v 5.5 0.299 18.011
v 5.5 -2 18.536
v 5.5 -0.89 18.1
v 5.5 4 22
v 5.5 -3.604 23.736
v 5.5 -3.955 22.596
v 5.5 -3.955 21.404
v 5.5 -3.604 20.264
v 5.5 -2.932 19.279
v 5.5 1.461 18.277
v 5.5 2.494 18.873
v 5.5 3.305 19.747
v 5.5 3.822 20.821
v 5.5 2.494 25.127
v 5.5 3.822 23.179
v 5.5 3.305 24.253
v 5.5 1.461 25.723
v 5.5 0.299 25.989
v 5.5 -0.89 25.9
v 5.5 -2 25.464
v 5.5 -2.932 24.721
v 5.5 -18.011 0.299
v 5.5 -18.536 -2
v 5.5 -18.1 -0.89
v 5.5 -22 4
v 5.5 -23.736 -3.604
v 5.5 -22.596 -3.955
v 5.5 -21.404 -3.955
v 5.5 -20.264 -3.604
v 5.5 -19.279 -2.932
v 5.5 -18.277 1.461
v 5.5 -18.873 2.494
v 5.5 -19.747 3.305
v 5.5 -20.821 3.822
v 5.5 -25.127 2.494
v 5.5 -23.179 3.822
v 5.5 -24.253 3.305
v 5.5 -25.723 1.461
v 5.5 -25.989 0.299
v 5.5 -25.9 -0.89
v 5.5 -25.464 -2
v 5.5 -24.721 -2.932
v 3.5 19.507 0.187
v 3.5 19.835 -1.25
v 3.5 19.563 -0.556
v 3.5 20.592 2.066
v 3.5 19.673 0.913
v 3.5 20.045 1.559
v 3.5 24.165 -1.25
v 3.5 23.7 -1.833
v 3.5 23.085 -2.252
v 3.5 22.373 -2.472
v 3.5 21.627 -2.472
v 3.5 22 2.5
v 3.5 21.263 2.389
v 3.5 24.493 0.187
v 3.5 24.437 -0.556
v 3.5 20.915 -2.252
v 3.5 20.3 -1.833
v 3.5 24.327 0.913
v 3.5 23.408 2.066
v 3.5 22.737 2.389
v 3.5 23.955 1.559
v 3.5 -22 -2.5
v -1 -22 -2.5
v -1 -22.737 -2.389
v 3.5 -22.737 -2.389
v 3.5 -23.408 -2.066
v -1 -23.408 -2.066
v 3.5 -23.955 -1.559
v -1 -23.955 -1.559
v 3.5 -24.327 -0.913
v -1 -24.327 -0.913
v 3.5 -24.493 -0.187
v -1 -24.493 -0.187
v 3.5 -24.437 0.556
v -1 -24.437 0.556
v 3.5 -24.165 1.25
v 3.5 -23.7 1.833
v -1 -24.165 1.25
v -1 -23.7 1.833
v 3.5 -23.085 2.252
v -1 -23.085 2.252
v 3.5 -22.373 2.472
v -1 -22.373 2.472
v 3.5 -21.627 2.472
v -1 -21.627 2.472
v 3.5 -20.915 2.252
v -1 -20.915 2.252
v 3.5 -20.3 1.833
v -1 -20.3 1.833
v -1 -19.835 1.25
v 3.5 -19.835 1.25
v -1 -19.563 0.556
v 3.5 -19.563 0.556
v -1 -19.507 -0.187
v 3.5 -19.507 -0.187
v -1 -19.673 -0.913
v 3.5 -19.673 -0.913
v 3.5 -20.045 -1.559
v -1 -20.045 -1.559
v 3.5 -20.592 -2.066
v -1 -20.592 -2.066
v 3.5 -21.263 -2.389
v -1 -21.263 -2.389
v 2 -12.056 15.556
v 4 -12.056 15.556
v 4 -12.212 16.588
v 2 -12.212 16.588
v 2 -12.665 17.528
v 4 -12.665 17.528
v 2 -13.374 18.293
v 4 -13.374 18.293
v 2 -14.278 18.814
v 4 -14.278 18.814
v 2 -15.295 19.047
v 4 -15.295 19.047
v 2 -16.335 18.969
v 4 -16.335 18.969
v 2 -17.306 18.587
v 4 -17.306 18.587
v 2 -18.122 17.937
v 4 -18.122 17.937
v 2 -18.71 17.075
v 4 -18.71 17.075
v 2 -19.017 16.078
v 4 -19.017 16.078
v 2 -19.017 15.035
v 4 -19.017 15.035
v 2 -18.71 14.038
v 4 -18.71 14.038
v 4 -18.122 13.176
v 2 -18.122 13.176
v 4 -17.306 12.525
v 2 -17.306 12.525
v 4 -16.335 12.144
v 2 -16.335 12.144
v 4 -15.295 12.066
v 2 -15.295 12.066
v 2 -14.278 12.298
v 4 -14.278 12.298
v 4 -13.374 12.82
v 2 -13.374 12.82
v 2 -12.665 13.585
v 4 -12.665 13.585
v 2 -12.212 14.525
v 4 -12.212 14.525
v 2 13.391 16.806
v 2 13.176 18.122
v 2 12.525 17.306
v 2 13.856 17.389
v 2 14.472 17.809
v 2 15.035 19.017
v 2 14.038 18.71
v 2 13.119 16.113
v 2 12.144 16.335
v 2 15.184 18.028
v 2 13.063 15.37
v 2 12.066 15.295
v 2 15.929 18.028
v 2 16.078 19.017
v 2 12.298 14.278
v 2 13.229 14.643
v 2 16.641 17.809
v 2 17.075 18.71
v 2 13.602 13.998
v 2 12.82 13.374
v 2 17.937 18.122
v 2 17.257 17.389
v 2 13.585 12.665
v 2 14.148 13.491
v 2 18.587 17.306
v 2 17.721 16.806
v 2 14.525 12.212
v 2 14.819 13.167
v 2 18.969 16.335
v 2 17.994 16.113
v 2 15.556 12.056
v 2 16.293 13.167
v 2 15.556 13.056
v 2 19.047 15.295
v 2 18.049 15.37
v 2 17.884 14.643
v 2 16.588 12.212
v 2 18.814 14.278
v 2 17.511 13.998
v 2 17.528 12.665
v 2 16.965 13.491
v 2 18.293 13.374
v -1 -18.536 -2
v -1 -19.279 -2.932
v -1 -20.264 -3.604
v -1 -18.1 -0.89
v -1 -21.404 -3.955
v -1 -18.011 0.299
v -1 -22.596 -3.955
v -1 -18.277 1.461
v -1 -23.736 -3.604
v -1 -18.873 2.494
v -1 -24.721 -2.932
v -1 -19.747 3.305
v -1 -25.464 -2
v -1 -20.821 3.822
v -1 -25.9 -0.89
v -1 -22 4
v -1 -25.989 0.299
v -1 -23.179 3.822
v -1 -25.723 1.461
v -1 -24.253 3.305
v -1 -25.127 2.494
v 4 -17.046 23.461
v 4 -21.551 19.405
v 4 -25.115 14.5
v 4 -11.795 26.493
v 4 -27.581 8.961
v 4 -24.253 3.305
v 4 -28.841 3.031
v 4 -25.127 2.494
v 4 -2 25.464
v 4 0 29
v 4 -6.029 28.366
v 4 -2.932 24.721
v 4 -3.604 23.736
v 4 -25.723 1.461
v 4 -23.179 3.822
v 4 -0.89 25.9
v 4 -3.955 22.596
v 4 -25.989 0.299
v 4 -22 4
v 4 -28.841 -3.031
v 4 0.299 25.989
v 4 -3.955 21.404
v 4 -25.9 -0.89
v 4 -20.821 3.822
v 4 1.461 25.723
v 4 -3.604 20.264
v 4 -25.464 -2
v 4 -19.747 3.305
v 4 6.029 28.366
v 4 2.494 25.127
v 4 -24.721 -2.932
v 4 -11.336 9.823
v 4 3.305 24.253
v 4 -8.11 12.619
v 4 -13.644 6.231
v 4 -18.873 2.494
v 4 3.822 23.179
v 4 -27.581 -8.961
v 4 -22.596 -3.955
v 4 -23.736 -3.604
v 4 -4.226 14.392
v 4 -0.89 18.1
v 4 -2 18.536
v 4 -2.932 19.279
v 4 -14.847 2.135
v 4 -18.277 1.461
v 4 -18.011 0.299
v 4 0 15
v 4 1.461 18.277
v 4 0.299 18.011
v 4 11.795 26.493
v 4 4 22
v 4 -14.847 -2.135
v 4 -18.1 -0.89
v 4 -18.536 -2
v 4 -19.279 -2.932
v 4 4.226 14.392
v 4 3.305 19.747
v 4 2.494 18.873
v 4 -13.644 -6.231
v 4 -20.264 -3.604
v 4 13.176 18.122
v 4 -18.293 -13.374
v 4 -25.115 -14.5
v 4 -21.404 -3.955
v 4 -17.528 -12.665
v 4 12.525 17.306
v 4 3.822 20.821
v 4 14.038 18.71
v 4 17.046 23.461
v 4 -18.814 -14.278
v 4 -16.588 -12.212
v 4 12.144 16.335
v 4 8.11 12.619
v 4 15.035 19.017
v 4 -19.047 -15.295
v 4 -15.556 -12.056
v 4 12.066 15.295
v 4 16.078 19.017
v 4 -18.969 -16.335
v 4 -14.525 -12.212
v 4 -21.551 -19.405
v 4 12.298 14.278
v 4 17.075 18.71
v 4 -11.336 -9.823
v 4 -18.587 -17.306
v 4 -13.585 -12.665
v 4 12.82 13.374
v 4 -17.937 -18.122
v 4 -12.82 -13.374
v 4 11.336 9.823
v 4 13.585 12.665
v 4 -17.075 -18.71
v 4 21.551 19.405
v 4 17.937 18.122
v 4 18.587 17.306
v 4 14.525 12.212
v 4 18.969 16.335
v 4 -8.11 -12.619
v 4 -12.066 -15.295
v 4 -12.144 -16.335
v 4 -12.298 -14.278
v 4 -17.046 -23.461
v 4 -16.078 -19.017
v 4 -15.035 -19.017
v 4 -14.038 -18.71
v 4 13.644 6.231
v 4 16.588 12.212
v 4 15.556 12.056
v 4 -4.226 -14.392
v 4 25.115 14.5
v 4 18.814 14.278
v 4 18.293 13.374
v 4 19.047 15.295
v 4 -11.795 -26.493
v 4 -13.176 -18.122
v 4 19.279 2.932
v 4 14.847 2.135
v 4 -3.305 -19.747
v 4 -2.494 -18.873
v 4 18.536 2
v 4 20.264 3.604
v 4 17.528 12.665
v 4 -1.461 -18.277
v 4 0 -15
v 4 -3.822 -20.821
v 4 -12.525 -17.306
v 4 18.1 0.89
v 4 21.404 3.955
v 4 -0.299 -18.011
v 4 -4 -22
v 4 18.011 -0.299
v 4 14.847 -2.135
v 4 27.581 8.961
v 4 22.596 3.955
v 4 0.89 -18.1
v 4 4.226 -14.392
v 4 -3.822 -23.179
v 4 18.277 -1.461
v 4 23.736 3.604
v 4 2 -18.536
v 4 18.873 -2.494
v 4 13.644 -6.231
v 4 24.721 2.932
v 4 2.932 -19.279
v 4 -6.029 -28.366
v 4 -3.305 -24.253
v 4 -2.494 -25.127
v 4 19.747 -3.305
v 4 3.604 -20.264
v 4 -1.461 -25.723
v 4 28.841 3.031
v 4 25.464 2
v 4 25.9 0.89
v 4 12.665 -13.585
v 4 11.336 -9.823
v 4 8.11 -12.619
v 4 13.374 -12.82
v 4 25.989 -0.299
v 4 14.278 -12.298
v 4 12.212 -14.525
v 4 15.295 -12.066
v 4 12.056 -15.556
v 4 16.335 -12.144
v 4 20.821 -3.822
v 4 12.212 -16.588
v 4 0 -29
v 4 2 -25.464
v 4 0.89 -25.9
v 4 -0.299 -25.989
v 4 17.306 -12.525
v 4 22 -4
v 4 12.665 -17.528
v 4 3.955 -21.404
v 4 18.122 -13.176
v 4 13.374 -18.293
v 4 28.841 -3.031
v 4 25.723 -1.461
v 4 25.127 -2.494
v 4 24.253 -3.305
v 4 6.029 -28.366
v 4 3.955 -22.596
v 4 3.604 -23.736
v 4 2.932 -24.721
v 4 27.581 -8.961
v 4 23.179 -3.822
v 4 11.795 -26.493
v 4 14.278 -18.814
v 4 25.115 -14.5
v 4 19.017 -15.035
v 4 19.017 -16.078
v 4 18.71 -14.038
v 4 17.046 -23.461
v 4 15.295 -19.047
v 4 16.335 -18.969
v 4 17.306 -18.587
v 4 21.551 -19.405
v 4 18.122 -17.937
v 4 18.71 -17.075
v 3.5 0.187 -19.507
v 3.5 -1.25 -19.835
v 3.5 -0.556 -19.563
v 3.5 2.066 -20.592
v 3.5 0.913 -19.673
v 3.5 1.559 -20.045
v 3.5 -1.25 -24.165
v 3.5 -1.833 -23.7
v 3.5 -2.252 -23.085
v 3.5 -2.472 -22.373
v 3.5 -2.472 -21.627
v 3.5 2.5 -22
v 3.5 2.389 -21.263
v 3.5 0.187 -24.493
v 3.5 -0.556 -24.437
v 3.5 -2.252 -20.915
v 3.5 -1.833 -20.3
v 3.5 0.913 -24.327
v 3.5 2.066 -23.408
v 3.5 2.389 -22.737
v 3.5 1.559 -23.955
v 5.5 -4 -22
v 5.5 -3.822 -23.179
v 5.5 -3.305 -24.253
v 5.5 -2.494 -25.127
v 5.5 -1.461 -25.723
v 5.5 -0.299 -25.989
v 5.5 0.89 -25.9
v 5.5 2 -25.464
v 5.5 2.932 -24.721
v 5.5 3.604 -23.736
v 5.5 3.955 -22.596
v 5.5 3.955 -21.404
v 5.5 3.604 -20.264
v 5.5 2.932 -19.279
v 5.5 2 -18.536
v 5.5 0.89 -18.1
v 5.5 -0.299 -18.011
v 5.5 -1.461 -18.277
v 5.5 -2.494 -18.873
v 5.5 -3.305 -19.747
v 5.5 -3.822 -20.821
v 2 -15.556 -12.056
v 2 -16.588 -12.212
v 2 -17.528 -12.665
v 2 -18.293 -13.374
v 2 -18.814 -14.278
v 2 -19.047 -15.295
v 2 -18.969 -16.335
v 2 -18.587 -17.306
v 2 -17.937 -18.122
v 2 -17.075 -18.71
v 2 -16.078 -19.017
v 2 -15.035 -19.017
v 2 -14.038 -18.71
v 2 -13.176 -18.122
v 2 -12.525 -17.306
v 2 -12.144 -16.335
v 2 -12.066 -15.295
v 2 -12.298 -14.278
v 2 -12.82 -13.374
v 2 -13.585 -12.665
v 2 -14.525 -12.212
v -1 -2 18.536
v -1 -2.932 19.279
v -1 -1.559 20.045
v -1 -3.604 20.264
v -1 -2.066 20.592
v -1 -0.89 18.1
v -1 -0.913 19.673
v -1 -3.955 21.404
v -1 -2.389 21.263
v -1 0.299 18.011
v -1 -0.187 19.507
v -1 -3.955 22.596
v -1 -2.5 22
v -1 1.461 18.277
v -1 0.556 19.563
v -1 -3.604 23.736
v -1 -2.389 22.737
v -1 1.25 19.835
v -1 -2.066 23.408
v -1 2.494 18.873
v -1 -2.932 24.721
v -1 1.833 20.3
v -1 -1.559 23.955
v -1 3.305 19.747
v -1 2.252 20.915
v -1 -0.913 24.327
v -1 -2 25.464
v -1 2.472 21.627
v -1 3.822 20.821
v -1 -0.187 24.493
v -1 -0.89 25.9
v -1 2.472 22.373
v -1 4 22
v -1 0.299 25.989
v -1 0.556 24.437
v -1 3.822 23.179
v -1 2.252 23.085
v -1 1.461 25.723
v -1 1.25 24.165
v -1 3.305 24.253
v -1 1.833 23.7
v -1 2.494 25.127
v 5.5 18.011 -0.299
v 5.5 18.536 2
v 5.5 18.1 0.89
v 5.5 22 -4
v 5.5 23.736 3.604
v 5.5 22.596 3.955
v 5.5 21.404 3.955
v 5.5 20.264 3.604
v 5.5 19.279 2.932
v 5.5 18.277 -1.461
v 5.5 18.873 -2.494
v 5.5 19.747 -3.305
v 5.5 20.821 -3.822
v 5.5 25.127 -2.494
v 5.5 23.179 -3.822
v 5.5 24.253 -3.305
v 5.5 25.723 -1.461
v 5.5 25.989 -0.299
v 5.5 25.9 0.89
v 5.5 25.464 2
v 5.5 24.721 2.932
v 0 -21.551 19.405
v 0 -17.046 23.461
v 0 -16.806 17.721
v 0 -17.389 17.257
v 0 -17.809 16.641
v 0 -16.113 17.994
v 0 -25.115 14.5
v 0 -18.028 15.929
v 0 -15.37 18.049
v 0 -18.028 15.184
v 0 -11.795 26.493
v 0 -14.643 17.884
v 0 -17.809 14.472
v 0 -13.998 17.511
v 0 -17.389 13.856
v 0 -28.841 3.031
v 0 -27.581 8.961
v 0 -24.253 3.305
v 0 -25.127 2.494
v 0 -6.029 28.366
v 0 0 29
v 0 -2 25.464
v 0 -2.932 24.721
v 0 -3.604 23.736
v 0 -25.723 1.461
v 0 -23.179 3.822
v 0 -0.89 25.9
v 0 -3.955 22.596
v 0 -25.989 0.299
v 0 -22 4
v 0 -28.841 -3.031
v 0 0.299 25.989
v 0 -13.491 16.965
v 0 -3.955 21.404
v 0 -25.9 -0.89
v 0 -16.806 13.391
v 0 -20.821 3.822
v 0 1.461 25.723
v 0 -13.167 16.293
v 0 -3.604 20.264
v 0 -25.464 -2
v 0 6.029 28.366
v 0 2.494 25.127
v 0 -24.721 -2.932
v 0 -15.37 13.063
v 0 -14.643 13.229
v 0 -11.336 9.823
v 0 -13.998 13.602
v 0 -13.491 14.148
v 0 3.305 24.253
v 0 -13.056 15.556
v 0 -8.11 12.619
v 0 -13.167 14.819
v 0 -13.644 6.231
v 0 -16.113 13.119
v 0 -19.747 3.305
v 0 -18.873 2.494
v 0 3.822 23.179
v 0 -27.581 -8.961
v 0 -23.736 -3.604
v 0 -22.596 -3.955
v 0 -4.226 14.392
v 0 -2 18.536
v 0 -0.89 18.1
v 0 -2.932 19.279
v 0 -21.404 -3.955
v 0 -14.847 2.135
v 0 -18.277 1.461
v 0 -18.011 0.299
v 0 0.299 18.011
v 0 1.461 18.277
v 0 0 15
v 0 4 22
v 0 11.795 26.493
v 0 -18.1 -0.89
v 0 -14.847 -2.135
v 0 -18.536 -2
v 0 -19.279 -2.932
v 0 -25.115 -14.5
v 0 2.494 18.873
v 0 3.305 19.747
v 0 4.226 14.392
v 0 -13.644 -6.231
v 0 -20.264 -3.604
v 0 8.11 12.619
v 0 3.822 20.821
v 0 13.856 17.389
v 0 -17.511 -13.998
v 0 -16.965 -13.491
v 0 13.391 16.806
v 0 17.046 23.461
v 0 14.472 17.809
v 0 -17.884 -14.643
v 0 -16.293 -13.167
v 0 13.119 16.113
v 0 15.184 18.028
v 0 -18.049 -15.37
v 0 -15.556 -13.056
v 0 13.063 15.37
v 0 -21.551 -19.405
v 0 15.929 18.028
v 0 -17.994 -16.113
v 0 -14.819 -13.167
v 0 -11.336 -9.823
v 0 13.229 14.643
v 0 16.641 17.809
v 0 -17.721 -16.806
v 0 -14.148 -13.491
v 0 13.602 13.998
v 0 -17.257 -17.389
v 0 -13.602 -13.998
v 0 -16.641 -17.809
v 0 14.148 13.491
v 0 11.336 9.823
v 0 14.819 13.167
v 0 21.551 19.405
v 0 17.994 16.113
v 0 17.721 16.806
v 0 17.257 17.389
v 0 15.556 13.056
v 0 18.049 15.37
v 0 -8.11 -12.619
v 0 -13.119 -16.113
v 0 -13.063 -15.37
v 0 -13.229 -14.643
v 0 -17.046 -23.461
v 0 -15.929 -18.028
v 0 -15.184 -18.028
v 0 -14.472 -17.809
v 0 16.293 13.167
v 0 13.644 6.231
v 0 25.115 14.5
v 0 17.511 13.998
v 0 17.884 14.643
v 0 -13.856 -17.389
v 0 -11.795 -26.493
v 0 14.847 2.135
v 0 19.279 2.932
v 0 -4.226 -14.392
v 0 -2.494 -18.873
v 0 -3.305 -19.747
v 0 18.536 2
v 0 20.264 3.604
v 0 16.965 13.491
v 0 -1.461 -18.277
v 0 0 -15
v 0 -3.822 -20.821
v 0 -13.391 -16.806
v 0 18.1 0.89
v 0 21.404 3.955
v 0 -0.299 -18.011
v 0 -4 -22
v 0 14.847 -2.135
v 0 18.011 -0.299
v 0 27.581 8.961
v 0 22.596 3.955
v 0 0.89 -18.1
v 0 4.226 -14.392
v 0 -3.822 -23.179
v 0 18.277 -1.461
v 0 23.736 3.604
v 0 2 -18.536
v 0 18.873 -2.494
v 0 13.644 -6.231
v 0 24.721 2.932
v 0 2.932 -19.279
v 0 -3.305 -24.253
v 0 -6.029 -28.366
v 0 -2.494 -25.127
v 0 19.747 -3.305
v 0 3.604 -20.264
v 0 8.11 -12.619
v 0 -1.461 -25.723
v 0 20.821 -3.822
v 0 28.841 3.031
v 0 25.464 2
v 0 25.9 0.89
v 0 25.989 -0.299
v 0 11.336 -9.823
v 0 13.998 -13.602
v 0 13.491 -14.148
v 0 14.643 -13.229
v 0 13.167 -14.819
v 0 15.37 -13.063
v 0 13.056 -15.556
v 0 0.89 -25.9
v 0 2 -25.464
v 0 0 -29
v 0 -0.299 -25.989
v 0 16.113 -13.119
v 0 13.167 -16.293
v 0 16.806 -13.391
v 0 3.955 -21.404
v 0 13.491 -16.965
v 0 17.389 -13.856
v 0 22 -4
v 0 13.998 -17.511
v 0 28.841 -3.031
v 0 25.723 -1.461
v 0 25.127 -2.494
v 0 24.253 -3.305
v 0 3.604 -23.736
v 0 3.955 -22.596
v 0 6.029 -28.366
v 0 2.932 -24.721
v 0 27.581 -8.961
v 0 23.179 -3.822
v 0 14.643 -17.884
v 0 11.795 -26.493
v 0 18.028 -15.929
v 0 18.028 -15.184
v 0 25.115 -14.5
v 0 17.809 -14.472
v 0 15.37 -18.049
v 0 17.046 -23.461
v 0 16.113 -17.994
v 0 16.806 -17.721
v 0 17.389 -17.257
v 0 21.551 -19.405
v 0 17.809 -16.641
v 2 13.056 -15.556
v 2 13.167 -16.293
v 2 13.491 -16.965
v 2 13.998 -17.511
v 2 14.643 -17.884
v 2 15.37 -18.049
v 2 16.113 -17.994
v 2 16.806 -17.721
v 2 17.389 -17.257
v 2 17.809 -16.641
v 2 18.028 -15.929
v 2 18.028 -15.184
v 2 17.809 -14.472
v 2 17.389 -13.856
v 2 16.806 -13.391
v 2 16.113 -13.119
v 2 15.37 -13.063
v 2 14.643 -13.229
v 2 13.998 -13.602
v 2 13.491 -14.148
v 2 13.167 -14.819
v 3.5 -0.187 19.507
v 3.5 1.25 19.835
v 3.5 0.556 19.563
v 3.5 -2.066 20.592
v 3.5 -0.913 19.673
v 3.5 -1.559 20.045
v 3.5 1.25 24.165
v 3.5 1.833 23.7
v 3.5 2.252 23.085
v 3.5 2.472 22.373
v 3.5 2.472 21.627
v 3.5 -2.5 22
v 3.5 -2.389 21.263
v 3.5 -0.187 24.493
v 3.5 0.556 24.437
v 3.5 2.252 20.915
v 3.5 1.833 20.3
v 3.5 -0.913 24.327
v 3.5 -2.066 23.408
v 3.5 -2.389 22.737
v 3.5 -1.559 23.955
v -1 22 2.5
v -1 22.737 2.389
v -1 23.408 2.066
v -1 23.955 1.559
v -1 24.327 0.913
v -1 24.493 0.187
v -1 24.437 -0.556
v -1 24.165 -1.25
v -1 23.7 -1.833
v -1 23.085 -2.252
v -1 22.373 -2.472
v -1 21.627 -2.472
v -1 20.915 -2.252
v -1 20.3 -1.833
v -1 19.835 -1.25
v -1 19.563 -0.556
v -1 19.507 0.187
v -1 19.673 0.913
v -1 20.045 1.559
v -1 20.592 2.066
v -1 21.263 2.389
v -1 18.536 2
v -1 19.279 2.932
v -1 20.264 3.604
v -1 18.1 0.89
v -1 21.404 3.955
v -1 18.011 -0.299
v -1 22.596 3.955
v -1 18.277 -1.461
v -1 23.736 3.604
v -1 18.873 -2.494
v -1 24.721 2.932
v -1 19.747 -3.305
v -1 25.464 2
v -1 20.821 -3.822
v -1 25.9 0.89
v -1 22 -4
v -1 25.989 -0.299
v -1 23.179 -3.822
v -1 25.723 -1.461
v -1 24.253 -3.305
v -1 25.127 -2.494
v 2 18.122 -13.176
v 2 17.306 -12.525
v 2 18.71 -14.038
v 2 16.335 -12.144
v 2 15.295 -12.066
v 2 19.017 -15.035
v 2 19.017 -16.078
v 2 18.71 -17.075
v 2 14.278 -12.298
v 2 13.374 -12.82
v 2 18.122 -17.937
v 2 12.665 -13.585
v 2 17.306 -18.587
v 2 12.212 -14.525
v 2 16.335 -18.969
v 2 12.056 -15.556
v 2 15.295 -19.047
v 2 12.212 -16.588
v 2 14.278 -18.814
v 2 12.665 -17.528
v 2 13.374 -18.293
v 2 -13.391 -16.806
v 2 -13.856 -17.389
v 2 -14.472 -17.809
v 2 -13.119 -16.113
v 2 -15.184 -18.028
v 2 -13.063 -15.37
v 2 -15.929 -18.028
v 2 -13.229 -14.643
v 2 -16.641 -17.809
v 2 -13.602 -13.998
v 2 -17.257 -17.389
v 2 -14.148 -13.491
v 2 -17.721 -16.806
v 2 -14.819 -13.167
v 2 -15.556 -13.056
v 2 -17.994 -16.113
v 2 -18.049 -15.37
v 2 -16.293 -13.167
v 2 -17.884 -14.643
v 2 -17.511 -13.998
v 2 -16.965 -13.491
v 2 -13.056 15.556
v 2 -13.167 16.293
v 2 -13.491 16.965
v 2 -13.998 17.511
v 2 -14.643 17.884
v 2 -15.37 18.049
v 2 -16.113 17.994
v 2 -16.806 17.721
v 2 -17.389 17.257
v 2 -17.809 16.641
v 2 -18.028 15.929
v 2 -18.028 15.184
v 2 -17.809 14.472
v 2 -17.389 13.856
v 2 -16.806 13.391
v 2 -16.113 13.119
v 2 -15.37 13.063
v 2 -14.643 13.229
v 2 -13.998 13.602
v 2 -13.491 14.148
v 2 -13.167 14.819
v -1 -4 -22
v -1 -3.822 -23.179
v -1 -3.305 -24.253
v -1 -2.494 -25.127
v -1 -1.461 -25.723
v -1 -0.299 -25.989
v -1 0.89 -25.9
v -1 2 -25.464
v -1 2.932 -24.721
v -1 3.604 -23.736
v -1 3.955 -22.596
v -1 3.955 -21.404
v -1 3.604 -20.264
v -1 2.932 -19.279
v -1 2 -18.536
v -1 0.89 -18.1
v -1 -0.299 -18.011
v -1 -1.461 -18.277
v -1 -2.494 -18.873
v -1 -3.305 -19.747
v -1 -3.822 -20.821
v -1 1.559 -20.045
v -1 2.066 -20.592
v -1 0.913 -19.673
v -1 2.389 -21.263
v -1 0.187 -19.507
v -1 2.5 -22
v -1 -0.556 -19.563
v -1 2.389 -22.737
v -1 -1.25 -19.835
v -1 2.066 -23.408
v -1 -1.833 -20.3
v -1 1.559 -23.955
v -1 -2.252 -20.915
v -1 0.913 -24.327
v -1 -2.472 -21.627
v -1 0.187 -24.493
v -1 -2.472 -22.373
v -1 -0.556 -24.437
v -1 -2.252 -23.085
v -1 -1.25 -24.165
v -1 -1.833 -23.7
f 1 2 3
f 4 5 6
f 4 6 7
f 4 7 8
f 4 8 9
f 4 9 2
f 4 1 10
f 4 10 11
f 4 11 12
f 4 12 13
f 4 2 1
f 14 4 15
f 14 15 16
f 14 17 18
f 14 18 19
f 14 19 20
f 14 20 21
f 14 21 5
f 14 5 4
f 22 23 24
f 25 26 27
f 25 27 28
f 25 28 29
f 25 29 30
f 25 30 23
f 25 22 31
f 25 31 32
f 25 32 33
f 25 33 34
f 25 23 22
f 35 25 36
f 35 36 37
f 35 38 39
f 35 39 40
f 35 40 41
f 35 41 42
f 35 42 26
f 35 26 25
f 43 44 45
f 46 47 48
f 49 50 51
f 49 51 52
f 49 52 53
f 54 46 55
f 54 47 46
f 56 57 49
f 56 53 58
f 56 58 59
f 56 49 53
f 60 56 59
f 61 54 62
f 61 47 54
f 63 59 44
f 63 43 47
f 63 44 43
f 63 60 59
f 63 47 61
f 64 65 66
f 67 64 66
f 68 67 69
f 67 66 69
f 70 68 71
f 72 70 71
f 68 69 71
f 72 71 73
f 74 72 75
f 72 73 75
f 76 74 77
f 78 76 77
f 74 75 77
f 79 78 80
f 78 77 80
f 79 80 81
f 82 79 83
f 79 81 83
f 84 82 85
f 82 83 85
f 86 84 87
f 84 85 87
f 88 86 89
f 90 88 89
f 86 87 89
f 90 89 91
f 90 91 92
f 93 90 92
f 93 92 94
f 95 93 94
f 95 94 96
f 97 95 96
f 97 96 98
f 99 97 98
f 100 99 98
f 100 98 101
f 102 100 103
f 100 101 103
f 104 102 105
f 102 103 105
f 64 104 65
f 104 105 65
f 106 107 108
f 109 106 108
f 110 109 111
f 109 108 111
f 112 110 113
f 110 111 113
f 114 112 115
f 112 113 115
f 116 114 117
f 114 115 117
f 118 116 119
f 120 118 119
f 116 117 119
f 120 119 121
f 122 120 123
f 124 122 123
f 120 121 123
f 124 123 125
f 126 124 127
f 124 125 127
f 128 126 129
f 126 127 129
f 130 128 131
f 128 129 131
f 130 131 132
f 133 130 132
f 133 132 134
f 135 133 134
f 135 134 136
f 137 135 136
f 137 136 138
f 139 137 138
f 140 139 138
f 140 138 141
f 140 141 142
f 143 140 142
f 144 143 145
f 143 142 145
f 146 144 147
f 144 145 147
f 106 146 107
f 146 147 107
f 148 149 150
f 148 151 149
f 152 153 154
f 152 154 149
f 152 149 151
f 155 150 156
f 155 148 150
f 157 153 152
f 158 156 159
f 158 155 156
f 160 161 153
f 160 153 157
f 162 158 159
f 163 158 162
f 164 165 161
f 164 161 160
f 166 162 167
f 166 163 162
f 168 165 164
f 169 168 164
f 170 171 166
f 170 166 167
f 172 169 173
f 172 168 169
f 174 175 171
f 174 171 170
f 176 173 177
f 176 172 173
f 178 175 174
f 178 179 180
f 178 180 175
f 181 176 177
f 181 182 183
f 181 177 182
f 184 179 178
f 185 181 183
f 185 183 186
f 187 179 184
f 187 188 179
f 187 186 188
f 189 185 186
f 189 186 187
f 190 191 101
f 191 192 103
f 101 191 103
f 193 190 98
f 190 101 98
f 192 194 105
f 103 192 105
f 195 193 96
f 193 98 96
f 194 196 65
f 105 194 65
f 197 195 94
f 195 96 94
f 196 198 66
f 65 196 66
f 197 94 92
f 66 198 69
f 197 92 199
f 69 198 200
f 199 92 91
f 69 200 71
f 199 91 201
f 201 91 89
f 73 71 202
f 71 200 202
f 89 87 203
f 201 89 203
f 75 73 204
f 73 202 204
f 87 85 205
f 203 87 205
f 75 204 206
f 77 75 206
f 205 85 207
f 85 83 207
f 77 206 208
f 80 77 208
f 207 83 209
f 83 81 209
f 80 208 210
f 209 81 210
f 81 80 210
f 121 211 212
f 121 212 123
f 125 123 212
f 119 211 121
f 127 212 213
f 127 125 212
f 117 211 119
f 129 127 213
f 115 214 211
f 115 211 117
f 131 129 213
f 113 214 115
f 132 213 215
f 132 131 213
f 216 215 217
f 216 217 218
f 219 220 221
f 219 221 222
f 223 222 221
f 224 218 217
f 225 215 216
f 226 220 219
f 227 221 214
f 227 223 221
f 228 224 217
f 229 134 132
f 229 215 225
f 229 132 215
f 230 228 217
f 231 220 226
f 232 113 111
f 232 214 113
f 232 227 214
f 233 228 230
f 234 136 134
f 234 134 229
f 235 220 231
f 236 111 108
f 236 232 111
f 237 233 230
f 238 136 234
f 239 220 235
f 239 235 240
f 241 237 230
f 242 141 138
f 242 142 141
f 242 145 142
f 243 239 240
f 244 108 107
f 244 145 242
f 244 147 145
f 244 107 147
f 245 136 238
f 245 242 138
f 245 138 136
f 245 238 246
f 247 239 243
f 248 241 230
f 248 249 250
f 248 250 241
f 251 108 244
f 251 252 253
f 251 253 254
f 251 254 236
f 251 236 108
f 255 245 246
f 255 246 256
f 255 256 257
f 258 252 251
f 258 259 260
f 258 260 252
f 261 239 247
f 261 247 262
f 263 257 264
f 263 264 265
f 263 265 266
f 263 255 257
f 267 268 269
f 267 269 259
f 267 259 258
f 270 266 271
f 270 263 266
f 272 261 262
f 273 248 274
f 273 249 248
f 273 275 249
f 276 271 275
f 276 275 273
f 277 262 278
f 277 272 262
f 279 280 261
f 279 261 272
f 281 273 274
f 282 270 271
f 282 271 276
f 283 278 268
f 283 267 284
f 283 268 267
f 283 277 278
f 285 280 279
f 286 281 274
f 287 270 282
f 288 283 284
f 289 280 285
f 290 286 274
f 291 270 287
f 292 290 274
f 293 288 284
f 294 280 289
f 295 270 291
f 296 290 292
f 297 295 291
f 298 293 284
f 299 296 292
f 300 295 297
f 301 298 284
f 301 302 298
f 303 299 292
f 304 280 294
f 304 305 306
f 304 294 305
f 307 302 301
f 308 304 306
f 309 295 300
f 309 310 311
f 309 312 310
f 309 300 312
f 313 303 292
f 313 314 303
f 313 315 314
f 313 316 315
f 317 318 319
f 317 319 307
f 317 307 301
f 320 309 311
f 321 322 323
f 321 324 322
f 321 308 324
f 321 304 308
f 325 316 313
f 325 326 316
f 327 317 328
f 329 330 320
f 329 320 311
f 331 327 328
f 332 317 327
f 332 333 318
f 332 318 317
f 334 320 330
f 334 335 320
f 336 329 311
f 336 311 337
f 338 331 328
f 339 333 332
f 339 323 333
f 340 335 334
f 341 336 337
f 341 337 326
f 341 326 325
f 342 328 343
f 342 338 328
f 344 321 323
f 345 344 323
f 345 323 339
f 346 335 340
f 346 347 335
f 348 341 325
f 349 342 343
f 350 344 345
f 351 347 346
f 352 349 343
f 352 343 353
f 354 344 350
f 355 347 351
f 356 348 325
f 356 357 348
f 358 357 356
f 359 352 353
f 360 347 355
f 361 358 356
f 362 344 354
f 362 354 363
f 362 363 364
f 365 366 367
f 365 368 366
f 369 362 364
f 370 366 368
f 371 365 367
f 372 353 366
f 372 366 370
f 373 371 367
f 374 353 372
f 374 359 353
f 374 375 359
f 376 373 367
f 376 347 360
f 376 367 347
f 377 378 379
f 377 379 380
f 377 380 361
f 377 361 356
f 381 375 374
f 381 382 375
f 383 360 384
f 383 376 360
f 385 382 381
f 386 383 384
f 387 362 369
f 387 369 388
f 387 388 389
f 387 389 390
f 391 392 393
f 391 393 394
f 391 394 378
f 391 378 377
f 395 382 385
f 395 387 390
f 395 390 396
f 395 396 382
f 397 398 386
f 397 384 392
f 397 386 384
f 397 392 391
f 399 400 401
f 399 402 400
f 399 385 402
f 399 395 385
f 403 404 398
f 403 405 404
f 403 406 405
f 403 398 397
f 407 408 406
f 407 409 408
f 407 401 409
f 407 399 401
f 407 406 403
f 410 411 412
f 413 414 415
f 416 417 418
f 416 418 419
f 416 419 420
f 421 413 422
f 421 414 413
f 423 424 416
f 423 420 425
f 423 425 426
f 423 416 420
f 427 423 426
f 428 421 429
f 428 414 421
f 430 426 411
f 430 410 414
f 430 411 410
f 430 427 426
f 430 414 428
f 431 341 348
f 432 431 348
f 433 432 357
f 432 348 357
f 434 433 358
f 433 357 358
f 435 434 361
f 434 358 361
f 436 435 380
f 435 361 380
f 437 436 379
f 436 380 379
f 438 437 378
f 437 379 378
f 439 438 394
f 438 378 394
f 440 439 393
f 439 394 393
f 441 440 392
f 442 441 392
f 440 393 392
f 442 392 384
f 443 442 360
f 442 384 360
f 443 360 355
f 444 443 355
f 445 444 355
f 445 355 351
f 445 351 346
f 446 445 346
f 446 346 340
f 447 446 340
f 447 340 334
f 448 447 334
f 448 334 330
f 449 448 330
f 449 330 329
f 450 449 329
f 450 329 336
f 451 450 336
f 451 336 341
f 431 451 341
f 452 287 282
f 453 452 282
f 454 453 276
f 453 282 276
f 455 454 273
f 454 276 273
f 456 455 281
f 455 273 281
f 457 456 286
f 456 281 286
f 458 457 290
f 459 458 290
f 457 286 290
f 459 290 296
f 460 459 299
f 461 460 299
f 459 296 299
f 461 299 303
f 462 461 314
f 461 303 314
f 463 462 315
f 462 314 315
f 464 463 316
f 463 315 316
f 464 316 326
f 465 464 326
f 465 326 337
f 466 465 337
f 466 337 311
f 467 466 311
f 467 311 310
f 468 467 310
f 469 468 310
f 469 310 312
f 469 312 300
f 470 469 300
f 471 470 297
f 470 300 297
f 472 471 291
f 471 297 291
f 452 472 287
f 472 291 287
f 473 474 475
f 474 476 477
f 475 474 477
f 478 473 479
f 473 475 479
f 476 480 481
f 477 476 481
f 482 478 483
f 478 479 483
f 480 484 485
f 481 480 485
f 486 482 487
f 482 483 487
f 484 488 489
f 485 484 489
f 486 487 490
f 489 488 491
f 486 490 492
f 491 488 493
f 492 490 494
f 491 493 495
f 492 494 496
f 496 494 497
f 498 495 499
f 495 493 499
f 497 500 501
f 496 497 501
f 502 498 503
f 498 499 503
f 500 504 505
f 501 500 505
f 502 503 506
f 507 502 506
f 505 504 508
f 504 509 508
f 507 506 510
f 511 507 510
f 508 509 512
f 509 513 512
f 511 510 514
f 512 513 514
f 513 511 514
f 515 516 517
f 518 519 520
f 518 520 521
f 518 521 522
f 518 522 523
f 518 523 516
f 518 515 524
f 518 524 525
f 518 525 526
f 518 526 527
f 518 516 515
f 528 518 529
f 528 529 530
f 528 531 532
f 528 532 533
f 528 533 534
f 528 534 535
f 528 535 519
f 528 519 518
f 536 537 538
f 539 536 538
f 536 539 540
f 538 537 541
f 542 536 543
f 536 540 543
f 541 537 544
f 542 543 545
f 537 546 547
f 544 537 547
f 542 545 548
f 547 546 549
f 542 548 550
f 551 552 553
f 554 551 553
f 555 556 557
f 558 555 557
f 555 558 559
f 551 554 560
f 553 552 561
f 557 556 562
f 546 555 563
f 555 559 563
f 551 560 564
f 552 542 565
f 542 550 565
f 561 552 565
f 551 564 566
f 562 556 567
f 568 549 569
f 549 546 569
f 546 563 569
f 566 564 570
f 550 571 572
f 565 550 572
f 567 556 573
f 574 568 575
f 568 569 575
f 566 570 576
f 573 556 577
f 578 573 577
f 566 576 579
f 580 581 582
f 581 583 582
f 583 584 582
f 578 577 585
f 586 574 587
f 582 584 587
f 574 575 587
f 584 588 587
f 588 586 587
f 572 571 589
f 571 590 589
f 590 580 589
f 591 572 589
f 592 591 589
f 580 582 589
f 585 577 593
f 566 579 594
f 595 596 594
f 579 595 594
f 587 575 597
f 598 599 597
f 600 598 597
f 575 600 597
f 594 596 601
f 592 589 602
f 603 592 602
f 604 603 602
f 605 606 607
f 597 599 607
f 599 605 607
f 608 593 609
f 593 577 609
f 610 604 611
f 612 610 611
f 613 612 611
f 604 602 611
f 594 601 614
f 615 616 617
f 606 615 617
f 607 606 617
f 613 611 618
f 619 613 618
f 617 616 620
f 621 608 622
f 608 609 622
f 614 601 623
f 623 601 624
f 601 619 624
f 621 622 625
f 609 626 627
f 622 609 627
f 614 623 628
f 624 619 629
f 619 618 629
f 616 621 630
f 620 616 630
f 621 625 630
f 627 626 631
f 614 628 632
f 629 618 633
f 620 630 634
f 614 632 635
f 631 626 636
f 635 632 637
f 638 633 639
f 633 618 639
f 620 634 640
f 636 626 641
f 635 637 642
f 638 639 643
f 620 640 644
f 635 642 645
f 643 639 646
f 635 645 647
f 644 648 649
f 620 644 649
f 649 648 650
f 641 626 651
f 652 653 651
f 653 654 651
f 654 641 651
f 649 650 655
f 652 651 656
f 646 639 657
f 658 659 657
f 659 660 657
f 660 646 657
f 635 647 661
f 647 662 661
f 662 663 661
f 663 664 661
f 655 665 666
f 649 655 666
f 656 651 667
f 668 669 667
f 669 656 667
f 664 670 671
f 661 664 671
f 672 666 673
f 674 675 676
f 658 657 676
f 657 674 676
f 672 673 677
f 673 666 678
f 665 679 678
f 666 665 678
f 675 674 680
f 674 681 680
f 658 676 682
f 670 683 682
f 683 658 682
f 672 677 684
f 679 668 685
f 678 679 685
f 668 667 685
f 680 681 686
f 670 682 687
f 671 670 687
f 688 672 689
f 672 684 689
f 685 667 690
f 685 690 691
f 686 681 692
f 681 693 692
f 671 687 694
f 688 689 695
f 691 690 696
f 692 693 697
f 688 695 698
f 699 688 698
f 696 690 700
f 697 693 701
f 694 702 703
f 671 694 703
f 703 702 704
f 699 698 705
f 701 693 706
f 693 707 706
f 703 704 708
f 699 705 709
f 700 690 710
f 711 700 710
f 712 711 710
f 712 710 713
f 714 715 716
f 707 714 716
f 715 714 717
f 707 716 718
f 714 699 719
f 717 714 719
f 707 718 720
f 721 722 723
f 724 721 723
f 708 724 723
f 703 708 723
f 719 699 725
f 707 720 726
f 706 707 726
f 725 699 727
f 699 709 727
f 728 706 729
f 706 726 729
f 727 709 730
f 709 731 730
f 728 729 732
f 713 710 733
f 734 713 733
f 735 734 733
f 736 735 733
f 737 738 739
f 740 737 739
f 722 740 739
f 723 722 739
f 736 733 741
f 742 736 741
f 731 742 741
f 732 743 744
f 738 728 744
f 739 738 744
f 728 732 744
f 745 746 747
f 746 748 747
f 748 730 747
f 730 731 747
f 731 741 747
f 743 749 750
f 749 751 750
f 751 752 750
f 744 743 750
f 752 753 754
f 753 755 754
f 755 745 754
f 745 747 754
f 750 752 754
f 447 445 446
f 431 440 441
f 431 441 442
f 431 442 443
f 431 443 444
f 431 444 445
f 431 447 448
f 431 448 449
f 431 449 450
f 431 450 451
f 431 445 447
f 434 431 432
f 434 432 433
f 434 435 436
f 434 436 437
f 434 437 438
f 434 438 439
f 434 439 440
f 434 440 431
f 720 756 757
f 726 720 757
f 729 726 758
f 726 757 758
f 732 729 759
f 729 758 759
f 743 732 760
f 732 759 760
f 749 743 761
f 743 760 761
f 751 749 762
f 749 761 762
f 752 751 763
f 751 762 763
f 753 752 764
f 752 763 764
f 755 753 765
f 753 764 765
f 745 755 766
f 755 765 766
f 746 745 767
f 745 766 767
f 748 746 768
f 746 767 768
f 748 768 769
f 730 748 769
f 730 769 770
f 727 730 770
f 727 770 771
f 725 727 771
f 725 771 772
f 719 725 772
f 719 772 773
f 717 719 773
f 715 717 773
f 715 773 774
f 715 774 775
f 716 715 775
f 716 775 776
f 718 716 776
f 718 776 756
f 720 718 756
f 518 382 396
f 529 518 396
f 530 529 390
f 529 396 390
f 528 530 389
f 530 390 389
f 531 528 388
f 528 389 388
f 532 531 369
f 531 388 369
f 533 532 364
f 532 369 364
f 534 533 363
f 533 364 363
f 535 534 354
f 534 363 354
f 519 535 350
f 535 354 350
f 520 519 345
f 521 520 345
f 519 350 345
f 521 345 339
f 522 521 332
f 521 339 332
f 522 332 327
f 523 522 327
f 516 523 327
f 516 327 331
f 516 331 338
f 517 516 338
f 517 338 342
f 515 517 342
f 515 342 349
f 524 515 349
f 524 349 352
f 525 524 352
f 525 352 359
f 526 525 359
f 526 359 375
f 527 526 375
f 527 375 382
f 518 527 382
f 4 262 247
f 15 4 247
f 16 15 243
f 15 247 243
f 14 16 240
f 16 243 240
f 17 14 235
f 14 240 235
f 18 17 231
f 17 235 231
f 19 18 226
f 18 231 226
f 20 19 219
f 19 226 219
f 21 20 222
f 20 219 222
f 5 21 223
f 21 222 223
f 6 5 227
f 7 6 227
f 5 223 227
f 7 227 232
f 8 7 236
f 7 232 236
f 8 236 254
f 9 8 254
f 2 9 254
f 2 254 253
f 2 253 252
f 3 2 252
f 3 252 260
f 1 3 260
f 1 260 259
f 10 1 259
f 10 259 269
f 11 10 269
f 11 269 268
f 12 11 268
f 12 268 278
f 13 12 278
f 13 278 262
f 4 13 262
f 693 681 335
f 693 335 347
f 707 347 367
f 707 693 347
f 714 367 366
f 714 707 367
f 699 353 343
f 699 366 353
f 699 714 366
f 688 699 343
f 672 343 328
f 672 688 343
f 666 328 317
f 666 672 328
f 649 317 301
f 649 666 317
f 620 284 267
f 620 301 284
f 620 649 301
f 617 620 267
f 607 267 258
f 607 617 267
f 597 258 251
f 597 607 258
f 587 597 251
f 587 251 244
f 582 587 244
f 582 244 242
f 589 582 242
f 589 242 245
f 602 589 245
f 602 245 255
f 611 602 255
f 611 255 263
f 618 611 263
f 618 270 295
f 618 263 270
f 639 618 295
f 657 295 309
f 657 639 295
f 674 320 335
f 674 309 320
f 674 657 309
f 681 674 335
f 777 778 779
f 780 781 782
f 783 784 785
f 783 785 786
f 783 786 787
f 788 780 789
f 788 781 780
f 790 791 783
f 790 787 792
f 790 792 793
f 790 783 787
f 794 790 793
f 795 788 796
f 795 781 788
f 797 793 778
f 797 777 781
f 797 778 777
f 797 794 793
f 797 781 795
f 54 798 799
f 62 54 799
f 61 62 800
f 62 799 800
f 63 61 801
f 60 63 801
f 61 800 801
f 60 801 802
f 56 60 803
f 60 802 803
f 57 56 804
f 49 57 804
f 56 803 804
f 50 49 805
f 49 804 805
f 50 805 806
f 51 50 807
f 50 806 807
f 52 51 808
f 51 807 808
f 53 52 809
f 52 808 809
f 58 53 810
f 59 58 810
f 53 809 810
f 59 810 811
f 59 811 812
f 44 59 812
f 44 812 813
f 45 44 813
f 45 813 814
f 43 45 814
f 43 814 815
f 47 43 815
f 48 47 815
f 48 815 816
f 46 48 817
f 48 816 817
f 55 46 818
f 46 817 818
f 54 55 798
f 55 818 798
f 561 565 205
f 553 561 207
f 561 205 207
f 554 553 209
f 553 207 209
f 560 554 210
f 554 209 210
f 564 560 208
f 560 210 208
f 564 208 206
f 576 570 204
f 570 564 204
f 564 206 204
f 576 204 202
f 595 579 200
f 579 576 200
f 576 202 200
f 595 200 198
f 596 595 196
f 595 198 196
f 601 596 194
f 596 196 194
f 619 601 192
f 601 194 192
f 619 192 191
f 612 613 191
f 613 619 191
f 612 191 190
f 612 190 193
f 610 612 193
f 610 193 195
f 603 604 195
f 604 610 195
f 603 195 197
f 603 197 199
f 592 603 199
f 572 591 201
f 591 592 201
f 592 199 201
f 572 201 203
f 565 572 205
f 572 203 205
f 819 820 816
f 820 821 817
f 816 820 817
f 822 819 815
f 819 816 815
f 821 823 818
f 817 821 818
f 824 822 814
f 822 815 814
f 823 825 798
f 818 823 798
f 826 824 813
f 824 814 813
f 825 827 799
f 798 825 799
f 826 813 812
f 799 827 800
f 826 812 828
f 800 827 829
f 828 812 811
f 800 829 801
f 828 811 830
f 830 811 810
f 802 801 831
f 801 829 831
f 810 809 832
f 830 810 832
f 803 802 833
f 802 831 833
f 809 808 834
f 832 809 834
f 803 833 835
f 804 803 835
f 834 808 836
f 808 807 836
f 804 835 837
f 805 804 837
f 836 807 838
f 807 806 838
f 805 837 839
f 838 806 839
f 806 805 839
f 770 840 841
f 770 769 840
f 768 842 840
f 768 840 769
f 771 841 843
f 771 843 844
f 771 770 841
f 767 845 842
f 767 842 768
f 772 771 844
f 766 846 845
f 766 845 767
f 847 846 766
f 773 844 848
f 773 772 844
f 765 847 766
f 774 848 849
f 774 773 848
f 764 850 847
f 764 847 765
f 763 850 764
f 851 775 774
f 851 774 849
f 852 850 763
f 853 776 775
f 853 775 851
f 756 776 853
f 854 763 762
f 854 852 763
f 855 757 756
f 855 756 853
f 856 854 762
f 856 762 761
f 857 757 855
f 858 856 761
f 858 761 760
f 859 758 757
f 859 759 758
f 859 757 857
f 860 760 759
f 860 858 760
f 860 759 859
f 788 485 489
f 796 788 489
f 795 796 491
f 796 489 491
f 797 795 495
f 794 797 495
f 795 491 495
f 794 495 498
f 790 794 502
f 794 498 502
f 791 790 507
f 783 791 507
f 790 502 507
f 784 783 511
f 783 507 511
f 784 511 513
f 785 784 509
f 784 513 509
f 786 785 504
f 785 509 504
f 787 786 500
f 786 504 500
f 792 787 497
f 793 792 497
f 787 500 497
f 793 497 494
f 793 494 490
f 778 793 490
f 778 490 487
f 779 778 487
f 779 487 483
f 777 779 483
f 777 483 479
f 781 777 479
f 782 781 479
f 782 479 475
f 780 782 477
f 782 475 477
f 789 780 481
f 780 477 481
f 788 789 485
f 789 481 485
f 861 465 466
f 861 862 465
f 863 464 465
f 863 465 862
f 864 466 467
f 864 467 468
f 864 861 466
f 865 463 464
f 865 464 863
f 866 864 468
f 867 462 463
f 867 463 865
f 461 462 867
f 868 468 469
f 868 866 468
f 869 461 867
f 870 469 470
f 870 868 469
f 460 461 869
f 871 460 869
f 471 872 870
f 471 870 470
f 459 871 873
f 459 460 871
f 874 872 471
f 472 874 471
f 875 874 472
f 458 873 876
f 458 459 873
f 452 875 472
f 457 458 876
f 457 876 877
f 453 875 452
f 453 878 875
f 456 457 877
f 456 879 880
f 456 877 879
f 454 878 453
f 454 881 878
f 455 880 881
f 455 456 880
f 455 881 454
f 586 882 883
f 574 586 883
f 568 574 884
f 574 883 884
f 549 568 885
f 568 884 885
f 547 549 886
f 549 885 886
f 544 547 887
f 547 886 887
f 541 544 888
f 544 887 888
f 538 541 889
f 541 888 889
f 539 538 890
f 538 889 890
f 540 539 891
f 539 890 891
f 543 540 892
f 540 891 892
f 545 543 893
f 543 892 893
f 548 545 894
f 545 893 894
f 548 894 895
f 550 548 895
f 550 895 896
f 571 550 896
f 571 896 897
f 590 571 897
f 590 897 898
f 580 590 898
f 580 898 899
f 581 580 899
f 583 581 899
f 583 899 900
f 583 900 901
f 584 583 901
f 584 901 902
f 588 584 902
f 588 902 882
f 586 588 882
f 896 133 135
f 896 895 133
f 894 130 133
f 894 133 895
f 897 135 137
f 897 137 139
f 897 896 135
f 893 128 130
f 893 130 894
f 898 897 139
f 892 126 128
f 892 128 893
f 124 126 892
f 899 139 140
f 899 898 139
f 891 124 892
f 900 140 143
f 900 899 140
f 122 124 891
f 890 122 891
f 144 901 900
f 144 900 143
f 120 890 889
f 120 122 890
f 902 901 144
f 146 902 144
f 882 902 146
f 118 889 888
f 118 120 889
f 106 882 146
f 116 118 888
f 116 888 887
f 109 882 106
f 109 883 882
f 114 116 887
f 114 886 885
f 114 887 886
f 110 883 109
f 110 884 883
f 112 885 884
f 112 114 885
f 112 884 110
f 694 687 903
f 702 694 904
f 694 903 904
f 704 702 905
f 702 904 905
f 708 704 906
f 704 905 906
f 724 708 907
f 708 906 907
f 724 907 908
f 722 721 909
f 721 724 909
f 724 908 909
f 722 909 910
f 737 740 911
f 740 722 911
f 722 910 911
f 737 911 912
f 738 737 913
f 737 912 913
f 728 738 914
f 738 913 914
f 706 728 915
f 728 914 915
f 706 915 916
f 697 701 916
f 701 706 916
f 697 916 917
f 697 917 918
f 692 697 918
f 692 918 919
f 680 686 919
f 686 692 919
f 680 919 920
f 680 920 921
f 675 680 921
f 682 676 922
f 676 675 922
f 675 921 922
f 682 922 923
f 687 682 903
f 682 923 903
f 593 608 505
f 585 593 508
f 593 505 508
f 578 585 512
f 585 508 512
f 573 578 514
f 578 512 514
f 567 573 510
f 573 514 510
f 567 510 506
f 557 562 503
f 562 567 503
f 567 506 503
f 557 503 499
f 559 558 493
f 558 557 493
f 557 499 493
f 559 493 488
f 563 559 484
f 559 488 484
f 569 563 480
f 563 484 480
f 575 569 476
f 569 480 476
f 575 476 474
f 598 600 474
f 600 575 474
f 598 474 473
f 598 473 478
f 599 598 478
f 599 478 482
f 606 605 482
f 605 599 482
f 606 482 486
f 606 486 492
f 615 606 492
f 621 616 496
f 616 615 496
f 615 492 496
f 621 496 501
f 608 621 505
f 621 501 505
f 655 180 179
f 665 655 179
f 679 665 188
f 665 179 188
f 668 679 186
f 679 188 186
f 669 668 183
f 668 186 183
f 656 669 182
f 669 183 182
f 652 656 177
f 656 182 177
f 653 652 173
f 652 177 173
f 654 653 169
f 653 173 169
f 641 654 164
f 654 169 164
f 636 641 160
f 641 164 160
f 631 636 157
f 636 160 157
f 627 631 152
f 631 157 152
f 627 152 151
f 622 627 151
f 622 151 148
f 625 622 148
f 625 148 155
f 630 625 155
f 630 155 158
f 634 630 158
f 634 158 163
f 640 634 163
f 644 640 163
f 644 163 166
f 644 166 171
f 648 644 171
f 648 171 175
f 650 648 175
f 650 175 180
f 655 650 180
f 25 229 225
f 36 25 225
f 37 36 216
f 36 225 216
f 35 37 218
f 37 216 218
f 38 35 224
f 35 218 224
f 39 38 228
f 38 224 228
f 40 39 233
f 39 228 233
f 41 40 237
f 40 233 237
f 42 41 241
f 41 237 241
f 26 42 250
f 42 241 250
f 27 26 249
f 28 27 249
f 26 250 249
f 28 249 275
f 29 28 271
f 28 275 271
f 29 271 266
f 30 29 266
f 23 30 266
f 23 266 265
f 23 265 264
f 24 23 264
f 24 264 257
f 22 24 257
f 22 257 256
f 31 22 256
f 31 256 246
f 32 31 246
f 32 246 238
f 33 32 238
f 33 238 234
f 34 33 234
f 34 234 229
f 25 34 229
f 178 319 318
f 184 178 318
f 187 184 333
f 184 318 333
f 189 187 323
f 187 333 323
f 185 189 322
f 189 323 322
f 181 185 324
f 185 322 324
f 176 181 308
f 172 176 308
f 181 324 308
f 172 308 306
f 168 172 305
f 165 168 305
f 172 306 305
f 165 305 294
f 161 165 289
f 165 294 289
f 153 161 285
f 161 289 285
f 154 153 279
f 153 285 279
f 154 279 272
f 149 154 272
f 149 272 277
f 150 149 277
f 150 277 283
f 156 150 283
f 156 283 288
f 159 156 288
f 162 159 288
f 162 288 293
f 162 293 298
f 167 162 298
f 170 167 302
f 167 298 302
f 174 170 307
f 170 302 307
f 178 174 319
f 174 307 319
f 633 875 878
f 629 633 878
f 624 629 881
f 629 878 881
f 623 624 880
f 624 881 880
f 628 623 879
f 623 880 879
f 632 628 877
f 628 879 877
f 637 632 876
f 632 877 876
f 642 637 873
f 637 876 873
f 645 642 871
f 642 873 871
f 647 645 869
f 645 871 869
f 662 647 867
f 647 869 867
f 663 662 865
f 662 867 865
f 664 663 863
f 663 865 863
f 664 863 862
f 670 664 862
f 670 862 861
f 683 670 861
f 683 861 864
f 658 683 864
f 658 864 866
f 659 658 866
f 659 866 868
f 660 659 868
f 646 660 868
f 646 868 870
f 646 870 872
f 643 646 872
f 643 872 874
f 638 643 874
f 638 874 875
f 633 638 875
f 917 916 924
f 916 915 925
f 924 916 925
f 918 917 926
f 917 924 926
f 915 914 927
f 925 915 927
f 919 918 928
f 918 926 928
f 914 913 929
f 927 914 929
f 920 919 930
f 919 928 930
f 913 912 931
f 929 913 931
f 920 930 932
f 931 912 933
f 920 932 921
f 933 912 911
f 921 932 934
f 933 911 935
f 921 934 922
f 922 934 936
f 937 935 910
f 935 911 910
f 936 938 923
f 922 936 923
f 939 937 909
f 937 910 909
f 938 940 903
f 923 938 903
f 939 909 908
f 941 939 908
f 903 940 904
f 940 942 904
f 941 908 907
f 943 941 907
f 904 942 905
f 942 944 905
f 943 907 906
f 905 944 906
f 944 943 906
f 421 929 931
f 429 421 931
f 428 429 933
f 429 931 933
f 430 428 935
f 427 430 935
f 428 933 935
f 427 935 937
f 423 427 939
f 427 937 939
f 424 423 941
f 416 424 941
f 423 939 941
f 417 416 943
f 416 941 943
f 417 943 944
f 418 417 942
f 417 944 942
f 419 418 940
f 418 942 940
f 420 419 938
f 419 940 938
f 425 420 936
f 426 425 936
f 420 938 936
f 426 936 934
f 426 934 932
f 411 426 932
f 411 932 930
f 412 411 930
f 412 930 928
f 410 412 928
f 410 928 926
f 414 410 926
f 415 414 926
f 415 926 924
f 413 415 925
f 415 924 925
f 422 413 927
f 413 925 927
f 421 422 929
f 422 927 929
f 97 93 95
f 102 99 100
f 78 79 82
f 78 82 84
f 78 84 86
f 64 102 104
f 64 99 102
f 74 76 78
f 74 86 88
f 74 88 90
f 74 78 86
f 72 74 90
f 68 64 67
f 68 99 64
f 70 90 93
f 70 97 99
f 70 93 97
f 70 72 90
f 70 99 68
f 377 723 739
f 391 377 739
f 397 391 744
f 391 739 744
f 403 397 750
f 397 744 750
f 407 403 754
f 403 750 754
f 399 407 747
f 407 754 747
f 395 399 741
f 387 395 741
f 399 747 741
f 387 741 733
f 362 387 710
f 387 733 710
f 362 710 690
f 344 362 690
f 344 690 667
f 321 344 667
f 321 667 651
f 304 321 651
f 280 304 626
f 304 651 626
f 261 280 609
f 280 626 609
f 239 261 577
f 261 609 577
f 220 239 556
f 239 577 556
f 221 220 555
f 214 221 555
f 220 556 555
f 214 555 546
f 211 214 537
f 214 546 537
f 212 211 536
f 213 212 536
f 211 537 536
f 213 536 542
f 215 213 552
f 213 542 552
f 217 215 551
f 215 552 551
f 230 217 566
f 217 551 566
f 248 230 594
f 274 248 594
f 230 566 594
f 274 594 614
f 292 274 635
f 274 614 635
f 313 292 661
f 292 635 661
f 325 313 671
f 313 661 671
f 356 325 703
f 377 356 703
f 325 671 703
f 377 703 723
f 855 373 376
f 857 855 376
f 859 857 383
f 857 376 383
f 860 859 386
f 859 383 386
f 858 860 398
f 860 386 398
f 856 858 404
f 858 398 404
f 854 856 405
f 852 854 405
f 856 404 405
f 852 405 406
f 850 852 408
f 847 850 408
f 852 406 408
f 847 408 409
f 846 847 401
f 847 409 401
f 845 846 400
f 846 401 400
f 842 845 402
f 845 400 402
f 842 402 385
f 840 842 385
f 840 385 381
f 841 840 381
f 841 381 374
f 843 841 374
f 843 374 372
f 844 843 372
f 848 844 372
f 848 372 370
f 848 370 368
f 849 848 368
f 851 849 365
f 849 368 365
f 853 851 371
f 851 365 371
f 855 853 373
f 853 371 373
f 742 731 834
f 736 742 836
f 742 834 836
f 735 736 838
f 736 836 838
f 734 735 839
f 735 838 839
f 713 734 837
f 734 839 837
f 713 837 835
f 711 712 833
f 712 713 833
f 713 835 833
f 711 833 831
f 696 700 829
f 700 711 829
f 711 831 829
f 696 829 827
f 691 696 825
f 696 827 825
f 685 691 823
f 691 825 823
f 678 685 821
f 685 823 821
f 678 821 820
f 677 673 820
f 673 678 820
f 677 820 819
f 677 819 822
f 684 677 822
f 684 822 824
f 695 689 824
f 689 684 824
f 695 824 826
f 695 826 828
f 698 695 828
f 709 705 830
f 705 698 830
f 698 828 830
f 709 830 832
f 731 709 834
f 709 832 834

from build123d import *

# Parameters (mm, degrees)
SKETCH_1_R               = 29
EXTRUDE_1_DEPTH          = 4
CUT_EXTRUDE_1_DEPTH      = 42.206795556
CUT_EXTRUDE_1_DEPTH_BACK = 42.206795556
SKETCH_2_R               = 15
EXTRUDE_START            = -5
SKETCH_4_R               = 4
EXTRUDE_3_DEPTH          = 6.5
PATTERN_CIRCULAR_1_COUNT = 4
SKETCH_5_R               = 2.5
CUT_EXTRUDE_2_DEPTH      = 4.5
PATTERN_CIRCULAR_2_COUNT = 4
SKETCH_7_R               = 2.5
CUT_EXTRUDE_3_DEPTH      = 42.31585652
SKETCH_8_R               = 3.5
CUT_EXTRUDE_4_DEPTH      = 2
PATTERN_CIRCULAR_3_COUNT = 4


with BuildPart() as part:
    # 草图1 → 凸台-拉伸1 (new body)
    with BuildSketch(Plane(origin=(0, 0, 0), x_dir=(0, 0, -1), z_dir=(1, 0, 0))):
        Circle(SKETCH_1_R)
    extrude(amount=EXTRUDE_1_DEPTH)

    # 草图2 → 切除-拉伸1 (cut, two sides: drawn at the far end of the back side and taken through both)
    with BuildSketch(Plane(origin=(4, 0, 0), x_dir=(0, 0, -1), z_dir=(1, 0, 0)).offset(-CUT_EXTRUDE_1_DEPTH_BACK)):
        Circle(SKETCH_2_R)
    extrude(amount=CUT_EXTRUDE_1_DEPTH + CUT_EXTRUDE_1_DEPTH_BACK, mode=Mode.SUBTRACT)

    # 草图4 → 凸台-拉伸3 (add)
    with BuildSketch(Plane(origin=(4, 0, 0), x_dir=(0, 0, -1), z_dir=(1, 0, 0)).offset(EXTRUDE_START)):
        with Locations((0, 22)):
            Circle(SKETCH_4_R)
    extrude_3 = extrude(amount=EXTRUDE_3_DEPTH)

    # 阵列(圆周)1: 凸台-拉伸3 ×4 about axis
    pattern_circular_1_axis = Axis((0, 0, 0), (1, 0, 0))
    for i in range(1, PATTERN_CIRCULAR_1_COUNT):
        add(extrude_3.rotate(pattern_circular_1_axis, i * 360 / PATTERN_CIRCULAR_1_COUNT))

    # 草图5 → 切除-拉伸2 (cut)
    with BuildSketch(Plane.ZY.offset(1)):
        with Locations((0, 22)):
            Circle(SKETCH_5_R)
    cut_extrude_2 = extrude(amount=-CUT_EXTRUDE_2_DEPTH, mode=Mode.SUBTRACT)

    # 阵列(圆周)2: 切除-拉伸2 ×4 about axis
    pattern_circular_2_axis = Axis((0, 0, 0), (1, 0, 0))
    for i in range(1, PATTERN_CIRCULAR_2_COUNT):
        add(cut_extrude_2.rotate(pattern_circular_2_axis, i * 360 / PATTERN_CIRCULAR_2_COUNT), mode=Mode.SUBTRACT)

    # 草图7 → 切除-拉伸3 (cut, through all)
    with BuildSketch(Plane(origin=(4, 0, 0), x_dir=(0, 0, -1), z_dir=(1, 0, 0))):
        with Locations((-15.556349186, 15.556349186)):
            Circle(SKETCH_7_R)
    cut_extrude_3 = extrude(amount=-CUT_EXTRUDE_3_DEPTH, mode=Mode.SUBTRACT)

    # 草图8 → 切除-拉伸4 (cut)
    with BuildSketch(Plane(origin=(4, 0, 0), x_dir=(0, 0, -1), z_dir=(1, 0, 0))):
        with Locations((-15.556349186, 15.556349186)):
            Circle(SKETCH_8_R)
    cut_extrude_4 = extrude(amount=-CUT_EXTRUDE_4_DEPTH, mode=Mode.SUBTRACT)

    # 阵列(圆周)3: 切除-拉伸3, 切除-拉伸4 ×4 about axis
    pattern_circular_3_axis = Axis((0, 0, 0), (1, 0, 0))
    add([cut_extrude_3.rotate(pattern_circular_3_axis, i * 360 / PATTERN_CIRCULAR_3_COUNT) for i in range(1, PATTERN_CIRCULAR_3_COUNT)], mode=Mode.SUBTRACT)
    add([cut_extrude_4.rotate(pattern_circular_3_axis, i * 360 / PATTERN_CIRCULAR_3_COUNT) for i in range(1, PATTERN_CIRCULAR_3_COUNT)], mode=Mode.SUBTRACT)


solid = part.part
